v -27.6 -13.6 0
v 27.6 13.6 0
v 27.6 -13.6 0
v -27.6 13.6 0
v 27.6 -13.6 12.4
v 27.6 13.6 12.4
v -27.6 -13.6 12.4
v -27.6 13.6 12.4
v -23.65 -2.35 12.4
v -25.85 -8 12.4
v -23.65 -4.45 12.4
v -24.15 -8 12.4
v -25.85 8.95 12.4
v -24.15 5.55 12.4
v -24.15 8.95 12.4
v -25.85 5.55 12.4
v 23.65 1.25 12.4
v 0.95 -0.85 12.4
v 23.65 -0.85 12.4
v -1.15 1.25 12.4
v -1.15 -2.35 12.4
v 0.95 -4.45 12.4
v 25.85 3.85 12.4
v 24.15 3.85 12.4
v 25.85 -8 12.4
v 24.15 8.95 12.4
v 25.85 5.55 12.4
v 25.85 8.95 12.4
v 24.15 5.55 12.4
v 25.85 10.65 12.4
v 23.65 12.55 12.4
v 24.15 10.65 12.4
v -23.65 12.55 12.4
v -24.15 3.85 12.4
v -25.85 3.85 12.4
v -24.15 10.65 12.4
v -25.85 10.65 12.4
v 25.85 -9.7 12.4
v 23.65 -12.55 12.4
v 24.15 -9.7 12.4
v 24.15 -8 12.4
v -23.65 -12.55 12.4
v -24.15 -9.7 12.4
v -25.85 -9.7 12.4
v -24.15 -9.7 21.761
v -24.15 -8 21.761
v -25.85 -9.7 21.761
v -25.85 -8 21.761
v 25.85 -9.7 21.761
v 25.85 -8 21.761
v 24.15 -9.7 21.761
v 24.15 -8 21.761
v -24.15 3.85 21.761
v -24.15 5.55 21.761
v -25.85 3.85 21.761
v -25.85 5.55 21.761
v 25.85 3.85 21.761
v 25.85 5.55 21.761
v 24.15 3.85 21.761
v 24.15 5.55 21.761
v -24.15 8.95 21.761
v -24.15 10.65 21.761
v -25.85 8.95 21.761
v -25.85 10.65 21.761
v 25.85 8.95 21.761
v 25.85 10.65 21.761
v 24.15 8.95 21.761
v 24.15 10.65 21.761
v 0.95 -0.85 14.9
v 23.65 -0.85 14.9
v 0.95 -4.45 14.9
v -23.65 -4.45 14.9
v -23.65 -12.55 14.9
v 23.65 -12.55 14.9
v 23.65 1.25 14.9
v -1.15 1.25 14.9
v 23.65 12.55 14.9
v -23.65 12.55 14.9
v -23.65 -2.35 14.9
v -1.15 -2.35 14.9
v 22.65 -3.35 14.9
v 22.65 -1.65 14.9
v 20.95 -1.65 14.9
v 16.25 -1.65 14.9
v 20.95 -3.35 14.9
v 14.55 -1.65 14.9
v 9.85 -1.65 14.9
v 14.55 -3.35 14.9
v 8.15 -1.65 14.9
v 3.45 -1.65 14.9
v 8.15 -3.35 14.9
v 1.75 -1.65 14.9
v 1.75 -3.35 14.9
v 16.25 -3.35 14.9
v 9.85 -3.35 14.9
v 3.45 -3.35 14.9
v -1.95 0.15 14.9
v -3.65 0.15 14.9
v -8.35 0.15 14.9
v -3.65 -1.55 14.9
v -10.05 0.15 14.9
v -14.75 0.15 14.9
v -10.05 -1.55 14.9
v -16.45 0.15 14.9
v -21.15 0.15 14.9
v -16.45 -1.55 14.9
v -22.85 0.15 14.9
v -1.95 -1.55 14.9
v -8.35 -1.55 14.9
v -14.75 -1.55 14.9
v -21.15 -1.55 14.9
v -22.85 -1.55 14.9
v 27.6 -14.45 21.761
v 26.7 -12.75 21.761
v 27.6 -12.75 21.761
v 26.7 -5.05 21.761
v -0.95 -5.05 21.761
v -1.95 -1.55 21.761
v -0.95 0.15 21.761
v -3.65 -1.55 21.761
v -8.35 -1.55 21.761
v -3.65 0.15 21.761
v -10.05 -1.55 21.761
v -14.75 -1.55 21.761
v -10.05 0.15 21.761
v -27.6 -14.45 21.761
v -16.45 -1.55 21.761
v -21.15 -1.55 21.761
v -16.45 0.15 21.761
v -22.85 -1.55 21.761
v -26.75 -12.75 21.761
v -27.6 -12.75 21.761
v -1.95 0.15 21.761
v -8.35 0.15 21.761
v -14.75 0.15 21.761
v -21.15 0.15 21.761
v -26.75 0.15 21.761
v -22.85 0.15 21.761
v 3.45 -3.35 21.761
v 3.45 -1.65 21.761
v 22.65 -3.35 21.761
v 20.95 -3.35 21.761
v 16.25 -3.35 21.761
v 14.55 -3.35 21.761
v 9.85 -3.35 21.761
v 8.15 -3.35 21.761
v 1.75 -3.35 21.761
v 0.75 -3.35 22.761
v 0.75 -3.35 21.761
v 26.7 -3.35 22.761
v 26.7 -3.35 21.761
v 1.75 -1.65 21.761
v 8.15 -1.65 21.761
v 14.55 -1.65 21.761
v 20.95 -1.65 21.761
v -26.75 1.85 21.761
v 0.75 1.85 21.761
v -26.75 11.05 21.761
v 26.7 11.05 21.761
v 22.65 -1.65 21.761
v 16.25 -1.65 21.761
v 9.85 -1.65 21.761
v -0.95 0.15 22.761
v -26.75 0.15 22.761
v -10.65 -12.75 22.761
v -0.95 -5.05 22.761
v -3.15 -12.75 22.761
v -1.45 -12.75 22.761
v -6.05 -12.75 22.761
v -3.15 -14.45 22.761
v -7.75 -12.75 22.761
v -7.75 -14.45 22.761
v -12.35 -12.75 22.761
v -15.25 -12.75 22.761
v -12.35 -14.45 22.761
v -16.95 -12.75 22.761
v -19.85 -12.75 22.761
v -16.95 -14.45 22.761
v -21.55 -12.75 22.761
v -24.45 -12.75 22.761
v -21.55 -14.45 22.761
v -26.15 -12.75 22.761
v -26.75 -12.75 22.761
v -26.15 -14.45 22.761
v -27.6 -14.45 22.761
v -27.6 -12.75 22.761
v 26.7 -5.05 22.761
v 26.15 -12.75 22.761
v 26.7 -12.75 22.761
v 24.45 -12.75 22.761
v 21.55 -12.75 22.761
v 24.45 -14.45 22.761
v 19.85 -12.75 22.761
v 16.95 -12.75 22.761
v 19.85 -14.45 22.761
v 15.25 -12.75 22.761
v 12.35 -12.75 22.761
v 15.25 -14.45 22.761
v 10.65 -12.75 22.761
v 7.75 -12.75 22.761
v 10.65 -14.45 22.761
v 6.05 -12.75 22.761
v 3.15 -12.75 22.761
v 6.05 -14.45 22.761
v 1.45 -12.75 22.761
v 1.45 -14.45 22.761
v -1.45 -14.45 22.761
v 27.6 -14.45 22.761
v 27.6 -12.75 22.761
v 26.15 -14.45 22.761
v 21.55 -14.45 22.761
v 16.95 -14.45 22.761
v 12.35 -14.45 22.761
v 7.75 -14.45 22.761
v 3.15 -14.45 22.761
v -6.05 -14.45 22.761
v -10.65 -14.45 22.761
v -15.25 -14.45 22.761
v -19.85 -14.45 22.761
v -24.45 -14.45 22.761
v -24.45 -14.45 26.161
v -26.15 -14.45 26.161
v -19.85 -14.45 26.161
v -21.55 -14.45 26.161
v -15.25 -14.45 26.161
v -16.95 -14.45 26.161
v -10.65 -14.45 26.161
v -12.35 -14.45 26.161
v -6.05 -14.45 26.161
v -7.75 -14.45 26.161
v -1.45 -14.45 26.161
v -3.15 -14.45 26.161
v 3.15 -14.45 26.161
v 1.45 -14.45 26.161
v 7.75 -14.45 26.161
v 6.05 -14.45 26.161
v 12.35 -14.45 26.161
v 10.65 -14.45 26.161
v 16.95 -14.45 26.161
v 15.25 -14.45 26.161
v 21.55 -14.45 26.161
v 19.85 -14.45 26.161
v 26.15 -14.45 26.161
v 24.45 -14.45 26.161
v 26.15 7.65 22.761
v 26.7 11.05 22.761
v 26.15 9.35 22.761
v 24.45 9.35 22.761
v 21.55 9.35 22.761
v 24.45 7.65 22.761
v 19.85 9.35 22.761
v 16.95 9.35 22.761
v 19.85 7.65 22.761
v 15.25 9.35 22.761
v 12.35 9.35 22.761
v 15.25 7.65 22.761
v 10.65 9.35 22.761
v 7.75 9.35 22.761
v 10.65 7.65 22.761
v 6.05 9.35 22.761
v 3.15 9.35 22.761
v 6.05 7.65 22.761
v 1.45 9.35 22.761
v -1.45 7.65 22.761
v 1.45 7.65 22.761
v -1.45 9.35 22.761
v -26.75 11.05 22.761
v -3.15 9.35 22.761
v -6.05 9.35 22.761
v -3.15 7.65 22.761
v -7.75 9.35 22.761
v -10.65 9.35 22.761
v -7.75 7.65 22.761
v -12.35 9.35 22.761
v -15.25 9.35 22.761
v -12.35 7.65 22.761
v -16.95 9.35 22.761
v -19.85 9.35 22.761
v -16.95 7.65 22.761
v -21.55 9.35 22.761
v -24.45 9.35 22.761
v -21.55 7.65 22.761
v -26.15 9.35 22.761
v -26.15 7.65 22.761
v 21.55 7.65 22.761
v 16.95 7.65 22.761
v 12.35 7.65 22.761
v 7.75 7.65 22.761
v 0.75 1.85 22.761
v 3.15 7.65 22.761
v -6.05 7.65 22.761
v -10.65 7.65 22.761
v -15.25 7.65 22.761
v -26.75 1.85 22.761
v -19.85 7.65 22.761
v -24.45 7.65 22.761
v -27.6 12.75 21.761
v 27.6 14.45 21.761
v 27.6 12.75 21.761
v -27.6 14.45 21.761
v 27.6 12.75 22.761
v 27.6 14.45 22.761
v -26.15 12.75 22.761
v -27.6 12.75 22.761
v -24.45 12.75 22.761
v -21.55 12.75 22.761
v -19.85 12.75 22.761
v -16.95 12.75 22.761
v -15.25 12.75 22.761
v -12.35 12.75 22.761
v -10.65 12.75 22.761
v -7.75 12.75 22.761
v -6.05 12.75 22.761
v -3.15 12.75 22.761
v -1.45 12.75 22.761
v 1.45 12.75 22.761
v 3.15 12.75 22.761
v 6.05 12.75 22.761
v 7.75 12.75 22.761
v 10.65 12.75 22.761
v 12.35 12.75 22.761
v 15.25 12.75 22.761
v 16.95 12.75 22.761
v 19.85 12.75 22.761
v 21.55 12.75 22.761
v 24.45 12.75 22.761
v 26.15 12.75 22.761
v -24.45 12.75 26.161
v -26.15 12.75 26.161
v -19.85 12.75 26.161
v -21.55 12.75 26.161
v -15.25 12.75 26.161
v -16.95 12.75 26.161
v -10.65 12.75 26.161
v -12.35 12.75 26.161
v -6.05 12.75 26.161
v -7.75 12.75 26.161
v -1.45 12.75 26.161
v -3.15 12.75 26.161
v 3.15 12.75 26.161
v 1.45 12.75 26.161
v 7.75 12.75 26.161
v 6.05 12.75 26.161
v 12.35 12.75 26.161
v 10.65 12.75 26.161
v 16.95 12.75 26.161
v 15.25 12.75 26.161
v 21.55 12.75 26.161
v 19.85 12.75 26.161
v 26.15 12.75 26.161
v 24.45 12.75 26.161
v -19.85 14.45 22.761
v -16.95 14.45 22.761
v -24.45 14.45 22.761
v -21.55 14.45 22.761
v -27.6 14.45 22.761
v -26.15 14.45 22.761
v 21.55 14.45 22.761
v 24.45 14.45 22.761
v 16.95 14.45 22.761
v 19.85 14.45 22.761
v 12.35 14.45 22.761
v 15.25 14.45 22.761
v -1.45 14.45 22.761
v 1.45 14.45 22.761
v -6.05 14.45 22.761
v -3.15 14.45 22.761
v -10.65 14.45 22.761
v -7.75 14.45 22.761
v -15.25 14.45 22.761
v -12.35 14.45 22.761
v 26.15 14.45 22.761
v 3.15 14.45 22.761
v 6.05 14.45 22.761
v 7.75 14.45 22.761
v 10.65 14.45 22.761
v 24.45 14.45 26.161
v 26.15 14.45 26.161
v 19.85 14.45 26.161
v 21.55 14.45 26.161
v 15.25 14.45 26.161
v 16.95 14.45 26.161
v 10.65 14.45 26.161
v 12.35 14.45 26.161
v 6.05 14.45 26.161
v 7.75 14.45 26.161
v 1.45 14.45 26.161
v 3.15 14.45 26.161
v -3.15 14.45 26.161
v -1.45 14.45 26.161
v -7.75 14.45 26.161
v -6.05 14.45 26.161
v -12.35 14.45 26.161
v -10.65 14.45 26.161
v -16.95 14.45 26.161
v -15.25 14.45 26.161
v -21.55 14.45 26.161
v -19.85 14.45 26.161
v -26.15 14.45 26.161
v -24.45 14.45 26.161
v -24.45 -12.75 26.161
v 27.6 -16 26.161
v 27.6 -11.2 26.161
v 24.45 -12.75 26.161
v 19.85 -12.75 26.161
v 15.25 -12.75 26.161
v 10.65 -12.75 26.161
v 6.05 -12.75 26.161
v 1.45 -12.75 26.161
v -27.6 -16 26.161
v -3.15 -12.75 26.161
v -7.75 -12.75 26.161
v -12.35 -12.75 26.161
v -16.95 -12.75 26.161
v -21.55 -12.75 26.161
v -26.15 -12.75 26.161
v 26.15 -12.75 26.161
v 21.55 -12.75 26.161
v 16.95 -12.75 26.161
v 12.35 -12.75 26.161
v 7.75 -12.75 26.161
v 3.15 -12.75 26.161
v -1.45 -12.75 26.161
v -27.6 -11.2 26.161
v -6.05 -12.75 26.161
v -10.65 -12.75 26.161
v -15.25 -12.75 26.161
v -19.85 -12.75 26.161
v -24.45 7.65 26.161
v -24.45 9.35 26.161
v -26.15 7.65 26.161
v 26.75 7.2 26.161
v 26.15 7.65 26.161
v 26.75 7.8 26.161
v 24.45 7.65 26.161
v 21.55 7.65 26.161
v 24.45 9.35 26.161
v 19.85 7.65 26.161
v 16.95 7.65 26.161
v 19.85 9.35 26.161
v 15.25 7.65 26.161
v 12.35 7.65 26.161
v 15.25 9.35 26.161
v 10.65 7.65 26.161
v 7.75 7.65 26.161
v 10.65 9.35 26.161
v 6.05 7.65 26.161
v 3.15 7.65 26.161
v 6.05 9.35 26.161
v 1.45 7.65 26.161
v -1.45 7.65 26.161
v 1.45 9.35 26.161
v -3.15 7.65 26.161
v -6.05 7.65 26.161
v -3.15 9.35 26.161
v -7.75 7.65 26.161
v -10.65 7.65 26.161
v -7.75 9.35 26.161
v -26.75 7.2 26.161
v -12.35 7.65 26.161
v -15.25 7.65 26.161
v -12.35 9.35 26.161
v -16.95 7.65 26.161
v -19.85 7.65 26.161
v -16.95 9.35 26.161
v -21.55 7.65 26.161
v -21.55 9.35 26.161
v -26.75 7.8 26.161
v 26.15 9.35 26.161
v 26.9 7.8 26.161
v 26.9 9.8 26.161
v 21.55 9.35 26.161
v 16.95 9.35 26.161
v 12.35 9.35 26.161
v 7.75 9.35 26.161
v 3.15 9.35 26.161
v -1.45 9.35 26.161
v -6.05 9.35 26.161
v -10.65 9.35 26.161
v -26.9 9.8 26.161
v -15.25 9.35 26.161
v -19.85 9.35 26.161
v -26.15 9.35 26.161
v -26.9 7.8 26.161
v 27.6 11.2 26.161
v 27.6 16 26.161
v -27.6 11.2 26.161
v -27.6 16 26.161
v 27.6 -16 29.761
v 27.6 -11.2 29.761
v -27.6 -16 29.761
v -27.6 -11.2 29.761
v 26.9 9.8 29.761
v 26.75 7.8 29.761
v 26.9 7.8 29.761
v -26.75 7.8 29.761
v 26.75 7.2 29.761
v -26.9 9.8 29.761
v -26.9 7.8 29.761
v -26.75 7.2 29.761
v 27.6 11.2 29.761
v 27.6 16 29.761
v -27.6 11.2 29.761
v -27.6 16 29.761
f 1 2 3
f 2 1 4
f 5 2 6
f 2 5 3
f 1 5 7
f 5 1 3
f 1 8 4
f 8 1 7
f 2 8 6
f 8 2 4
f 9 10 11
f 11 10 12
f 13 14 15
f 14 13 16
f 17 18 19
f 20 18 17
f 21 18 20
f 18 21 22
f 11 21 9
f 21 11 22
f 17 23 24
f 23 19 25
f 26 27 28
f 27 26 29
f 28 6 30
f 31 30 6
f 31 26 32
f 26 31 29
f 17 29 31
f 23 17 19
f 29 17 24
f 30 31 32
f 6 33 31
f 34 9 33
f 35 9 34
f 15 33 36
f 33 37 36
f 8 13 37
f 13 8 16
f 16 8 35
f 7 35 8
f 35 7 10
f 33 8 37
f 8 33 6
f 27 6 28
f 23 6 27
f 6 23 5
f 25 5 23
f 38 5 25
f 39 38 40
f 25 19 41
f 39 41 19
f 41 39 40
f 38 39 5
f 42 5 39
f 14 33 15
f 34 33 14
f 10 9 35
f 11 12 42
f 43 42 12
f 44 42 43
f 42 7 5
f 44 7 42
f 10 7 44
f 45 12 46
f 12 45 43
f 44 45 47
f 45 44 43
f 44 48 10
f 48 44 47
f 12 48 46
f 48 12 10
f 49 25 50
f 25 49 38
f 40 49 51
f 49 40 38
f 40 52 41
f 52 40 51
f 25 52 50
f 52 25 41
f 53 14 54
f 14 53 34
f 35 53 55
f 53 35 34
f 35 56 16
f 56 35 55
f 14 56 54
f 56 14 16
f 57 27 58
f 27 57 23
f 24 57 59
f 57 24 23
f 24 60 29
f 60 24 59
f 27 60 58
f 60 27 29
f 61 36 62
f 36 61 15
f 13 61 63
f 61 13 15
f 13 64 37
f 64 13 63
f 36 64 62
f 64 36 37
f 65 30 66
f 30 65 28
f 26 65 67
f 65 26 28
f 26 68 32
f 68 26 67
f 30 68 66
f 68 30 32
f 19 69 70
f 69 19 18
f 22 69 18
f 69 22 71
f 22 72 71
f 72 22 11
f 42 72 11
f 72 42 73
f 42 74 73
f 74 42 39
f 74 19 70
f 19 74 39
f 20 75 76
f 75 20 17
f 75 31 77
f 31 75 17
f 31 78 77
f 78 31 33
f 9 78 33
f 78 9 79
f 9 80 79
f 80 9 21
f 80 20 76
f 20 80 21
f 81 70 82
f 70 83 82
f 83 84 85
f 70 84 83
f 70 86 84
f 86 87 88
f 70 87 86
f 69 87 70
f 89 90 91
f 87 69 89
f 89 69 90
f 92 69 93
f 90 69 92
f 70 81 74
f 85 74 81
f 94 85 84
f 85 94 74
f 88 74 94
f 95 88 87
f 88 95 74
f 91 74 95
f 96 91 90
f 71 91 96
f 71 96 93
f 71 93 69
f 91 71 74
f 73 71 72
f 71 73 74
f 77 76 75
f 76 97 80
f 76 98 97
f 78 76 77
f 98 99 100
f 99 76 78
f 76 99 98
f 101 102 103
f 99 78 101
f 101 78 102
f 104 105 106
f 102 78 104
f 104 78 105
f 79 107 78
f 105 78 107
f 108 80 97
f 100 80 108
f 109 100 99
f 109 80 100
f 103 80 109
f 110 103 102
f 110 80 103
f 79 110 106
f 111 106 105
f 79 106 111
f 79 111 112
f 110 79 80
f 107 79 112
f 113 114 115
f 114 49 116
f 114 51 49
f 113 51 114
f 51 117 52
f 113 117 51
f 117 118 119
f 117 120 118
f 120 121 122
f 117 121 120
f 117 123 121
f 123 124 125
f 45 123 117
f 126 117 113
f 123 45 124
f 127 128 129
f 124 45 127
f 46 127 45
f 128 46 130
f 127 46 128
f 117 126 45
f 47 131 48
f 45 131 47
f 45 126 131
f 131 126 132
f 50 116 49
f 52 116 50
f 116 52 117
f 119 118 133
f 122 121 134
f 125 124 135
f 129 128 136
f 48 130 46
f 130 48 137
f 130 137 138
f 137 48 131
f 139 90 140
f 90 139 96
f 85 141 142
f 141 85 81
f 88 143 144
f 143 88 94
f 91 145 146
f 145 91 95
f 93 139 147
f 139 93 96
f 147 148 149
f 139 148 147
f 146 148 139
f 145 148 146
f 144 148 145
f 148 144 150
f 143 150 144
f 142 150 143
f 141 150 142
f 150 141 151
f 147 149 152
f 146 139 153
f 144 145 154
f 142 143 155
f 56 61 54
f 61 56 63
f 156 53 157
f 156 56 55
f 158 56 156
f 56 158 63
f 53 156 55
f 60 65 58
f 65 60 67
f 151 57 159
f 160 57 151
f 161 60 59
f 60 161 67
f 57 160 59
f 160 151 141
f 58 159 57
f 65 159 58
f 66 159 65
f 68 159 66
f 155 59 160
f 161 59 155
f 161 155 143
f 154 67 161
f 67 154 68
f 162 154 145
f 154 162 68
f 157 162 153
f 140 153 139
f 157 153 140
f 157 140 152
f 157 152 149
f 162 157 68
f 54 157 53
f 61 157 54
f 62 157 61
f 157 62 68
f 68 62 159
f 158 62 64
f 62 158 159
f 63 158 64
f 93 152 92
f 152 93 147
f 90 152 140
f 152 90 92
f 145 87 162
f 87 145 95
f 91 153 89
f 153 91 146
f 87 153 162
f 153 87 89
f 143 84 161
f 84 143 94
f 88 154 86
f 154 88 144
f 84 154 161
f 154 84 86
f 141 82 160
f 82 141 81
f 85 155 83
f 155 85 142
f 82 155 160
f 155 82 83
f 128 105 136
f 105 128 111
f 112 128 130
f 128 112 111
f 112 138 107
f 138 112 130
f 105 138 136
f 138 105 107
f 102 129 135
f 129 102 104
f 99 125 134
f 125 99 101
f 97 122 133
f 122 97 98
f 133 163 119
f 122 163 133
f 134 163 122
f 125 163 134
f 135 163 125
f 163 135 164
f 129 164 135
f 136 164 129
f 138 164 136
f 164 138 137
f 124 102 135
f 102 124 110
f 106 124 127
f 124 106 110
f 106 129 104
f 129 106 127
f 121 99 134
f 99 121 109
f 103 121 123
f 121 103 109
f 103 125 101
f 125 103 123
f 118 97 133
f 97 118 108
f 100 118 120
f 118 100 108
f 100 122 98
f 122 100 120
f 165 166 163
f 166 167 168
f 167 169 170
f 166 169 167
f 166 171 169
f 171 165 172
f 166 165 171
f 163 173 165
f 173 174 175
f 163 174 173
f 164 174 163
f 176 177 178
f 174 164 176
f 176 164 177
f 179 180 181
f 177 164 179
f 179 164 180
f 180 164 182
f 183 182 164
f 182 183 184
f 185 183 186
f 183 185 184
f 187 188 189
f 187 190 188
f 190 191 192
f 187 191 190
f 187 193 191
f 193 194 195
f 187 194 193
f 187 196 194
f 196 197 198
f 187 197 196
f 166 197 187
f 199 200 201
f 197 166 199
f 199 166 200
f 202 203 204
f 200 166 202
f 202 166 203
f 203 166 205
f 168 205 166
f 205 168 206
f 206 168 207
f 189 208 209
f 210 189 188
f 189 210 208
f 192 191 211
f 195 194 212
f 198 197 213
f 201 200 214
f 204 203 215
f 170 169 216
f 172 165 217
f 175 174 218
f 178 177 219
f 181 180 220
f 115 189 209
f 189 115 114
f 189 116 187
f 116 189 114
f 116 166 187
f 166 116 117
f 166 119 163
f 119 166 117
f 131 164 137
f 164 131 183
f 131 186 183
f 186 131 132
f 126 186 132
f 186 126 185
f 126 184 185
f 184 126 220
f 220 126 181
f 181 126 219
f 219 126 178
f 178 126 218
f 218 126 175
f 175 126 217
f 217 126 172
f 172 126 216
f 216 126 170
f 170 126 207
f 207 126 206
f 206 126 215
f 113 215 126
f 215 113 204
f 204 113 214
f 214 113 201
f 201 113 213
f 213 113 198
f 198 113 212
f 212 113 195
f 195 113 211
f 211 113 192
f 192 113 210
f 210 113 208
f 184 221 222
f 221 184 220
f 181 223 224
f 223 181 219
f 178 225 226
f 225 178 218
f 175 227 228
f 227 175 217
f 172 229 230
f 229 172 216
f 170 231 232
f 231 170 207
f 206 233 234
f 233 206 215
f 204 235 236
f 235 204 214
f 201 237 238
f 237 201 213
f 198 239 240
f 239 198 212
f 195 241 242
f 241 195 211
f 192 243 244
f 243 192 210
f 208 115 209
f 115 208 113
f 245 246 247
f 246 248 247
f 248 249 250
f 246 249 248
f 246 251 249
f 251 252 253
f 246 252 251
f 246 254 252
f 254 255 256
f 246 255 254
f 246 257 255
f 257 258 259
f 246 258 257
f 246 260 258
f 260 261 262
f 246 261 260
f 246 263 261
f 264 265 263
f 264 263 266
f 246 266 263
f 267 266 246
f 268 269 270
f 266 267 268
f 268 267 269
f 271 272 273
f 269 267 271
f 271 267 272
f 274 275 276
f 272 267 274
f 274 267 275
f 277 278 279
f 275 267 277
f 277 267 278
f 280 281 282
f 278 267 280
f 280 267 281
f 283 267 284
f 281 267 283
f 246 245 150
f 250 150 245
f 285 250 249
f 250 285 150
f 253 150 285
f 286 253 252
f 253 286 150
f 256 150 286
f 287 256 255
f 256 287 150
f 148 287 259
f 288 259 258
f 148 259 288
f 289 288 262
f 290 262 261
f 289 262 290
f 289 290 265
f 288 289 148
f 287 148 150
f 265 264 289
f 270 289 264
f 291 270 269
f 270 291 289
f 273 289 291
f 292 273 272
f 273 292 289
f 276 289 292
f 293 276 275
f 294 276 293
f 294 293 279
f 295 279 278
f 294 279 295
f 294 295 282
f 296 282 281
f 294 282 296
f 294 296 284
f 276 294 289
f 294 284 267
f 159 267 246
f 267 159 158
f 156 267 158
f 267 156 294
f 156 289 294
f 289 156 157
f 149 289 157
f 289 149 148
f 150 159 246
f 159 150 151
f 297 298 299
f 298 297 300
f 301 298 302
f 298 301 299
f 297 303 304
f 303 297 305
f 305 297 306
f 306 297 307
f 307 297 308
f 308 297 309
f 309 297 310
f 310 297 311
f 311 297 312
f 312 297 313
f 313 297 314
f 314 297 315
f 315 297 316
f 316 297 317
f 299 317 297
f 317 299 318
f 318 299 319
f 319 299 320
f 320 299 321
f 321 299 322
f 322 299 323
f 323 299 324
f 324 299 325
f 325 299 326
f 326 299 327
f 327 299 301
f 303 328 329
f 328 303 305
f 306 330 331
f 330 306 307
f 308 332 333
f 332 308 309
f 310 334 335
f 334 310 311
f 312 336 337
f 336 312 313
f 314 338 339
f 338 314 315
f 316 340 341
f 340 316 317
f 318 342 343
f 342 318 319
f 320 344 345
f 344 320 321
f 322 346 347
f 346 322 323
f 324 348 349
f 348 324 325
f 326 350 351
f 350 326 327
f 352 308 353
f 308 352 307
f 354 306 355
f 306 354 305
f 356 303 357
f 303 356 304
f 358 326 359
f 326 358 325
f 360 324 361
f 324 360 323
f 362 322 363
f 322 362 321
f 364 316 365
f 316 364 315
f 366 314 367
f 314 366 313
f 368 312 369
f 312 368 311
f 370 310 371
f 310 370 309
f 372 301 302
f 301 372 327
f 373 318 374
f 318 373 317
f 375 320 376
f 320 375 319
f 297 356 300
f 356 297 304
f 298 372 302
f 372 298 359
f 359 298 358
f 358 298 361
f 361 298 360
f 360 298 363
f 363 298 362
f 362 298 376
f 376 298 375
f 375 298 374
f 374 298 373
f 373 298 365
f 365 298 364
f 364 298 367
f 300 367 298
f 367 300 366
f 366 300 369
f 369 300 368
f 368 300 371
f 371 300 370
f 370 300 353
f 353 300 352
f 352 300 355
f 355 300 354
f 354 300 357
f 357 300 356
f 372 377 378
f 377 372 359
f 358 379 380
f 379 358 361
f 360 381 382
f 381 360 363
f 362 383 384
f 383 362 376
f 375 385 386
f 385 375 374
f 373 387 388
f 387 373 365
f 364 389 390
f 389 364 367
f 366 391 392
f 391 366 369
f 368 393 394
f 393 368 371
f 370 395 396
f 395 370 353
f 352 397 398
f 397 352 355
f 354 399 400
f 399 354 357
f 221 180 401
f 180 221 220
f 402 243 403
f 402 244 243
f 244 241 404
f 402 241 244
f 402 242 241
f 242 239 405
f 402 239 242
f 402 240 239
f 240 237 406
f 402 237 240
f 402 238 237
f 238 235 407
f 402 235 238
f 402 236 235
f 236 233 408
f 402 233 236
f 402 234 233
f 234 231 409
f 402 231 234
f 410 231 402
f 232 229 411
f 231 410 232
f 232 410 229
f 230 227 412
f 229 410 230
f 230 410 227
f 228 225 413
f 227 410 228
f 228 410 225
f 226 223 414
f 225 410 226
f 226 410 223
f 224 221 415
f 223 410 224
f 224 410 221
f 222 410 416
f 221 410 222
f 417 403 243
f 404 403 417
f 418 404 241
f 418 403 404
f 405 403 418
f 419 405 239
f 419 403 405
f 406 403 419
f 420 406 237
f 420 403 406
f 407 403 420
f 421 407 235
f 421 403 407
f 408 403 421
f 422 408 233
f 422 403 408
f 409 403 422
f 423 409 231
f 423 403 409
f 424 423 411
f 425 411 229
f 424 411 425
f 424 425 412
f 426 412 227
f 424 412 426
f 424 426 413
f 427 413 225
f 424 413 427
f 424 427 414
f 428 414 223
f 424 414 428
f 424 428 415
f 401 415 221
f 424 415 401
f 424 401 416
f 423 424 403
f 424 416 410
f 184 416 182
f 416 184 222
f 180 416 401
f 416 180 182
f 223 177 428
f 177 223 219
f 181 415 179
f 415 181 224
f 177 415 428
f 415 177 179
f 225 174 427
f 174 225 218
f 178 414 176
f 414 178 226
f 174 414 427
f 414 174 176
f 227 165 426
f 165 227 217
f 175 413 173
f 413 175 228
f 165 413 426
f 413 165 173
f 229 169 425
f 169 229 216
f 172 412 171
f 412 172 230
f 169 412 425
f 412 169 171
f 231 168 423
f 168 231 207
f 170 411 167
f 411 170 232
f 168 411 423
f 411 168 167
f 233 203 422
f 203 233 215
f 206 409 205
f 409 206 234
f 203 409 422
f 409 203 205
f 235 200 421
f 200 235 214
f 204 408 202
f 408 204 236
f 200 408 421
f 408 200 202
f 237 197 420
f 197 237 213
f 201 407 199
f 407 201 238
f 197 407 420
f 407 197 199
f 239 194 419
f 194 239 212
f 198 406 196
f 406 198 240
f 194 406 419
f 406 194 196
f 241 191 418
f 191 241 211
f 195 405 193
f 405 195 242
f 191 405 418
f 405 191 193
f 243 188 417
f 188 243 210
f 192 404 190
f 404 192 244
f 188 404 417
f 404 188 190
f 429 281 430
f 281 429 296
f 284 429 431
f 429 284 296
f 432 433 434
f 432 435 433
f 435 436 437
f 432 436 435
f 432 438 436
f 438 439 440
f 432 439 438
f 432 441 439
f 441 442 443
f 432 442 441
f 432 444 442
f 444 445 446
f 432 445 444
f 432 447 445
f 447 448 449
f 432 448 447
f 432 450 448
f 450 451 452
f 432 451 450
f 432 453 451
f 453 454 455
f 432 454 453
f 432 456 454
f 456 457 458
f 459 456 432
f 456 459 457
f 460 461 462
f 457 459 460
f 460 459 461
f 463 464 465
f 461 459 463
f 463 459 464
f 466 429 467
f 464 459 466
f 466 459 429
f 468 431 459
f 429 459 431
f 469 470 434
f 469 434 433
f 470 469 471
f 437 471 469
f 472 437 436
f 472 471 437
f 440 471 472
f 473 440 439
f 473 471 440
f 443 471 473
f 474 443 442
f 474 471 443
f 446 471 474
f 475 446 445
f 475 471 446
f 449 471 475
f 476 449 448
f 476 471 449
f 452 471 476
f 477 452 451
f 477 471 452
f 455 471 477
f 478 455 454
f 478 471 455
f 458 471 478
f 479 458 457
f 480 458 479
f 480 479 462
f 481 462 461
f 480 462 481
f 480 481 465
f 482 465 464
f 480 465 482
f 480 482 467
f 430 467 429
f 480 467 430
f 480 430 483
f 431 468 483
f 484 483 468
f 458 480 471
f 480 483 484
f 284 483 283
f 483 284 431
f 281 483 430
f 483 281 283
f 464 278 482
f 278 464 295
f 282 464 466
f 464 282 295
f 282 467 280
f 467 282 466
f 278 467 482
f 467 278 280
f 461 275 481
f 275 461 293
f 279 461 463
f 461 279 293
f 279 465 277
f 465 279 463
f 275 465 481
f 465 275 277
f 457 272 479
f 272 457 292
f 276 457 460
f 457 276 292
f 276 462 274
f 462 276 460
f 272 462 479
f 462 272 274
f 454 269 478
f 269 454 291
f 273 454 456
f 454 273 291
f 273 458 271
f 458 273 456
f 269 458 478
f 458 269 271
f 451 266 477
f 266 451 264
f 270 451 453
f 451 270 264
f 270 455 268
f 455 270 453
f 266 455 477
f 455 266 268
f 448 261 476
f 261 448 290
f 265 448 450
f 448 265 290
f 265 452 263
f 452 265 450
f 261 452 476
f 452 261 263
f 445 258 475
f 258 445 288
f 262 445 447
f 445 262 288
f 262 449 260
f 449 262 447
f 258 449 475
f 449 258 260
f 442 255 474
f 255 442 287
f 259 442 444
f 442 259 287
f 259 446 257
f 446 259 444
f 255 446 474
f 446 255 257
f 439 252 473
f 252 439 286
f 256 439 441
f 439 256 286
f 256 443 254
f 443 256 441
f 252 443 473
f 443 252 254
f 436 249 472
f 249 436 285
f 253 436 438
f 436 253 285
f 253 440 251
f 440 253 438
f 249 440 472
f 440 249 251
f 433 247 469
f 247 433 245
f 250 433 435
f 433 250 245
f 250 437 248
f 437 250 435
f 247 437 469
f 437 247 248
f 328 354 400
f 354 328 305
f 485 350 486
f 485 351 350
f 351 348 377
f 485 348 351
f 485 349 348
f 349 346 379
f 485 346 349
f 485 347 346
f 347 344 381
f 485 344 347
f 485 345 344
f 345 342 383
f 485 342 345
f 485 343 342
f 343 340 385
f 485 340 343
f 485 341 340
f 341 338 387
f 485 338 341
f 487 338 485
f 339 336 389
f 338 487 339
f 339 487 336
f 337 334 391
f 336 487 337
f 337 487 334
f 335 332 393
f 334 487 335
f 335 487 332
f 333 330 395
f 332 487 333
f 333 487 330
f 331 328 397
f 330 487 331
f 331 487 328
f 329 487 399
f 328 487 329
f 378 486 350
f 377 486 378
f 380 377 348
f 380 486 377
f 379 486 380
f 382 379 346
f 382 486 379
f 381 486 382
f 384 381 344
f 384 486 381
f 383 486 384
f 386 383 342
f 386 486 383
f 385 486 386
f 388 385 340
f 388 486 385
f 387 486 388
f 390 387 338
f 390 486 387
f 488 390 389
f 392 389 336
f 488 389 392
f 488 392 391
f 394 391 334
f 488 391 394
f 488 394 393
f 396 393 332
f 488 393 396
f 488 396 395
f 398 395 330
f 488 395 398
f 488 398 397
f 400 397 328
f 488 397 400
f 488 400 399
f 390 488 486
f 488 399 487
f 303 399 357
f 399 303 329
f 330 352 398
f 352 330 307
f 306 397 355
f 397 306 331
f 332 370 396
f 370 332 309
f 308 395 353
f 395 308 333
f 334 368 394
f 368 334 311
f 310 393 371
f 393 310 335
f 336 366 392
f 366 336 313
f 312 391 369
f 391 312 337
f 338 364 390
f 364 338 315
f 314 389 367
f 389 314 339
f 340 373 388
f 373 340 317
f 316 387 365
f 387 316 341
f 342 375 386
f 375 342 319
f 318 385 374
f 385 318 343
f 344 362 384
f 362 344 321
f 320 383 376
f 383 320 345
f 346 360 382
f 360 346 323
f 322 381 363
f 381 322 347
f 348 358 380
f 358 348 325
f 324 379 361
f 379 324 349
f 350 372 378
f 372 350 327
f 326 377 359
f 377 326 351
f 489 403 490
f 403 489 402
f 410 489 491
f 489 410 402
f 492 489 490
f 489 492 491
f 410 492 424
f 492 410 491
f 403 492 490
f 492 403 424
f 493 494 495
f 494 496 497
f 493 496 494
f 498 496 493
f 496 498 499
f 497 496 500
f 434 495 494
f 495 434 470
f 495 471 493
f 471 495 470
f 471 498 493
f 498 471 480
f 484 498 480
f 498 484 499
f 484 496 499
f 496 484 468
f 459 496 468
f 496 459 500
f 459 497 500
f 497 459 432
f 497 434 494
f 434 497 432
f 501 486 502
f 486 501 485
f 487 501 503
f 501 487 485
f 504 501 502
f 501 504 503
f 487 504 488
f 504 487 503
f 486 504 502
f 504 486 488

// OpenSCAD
// Generated by SolidPython 0.4.2 on 2020-09-29 23:21:05
//!OpenSCAD

scale(v = 0.0100000000) {
	translate(v = [-2760, -1360, 0]) {
		union() {
			color(c = [0.4000000000, 0.4000000000, 0.4000000000]) {
				translate(v = [0, 0, 0]) {
					linear_extrude(height = 1000.0000000000) {
						polygon(paths = [[0, 1, 2, 3]], points = [[0, 0], [0, 2720], [5520, 2720], [5520, 0]]);
					}
				}
			}
			color(c = [0.2000000000, 0.6000000000, 0.2000000000]) {
				translate(v = [0, 0, 1000.0000000000]) {
					linear_extrude(height = 120.0000000000) {
						polygon(paths = [[0, 1, 2, 3]], points = [[0, 1305], [0, 2720], [5520, 2720], [5520, 1305]]);
					}
				}
			}
			color(c = [0.4000000000, 0.4000000000, 0.4000000000]) {
				translate(v = [0, 0, 1000.0000000000]) {
					linear_extrude(height = 120.0000000000) {
						polygon(paths = [[0, 1, 2, 3]], points = [[0, 0], [0, 1305], [5520, 1305], [5520, 0]]);
					}
				}
			}
			color(c = [0.9000000000, 0.6000000000, 0.6000000000]) {
				translate(v = [0, 0, 1120.0000000000]) {
					linear_extrude(height = 120.0000000000) {
						polygon(paths = [[0, 1, 2, 3]], points = [[135, 1615], [135, 2485], [395, 2485], [395, 1615]]);
					}
				}
			}
			color(c = [0.9000000000, 0.6000000000, 0.6000000000]) {
				translate(v = [0, 0, 1120.0000000000]) {
					linear_extrude(height = 120.0000000000) {
						polygon(paths = [[0, 1, 2, 3]], points = [[5125, 1615], [5125, 2485], [5385, 2485], [5385, 1615]]);
					}
				}
			}
			color(c = [0.9000000000, 0.6000000000, 0.9000000000]) {
				translate(v = [0, 0, 1120.0000000000]) {
					linear_extrude(height = 120.0000000000) {
						polygon(paths = [[0, 1, 2, 3]], points = [[135, 235], [135, 785], [395, 785], [395, 235]]);
					}
				}
			}
			color(c = [0.9000000000, 0.6000000000, 0.9000000000]) {
				translate(v = [0, 0, 1120.0000000000]) {
					linear_extrude(height = 120.0000000000) {
						polygon(paths = [[0, 1, 2, 3]], points = [[5125, 235], [5125, 785], [5385, 785], [5385, 235]]);
					}
				}
			}
			color(c = [0.2000000000, 0.6000000000, 0.2000000000]) {
				translate(v = [0, 0, 1120.0000000000]) {
					linear_extrude(height = 120.0000000000) {
						difference() {
							polygon(paths = [[0, 1, 2, 3]], points = [[0, 1305], [0, 2720], [5520, 2720], [5520, 1305]]);
							polygon(paths = [[0, 1, 2, 3]], points = [[135, 1615], [395, 1615], [395, 2485], [135, 2485]]);
							polygon(paths = [[0, 1, 2, 3]], points = [[5125, 1615], [5385, 1615], [5385, 2485], [5125, 2485]]);
						}
					}
				}
			}
			color(c = [0.4000000000, 0.4000000000, 0.4000000000]) {
				translate(v = [0, 0, 1120.0000000000]) {
					linear_extrude(height = 120.0000000000) {
						difference() {
							polygon(paths = [[0, 1, 2, 3]], points = [[0, 0], [0, 1305], [5520, 1305], [5520, 0]]);
							polygon(paths = [[0, 1, 2, 3]], points = [[135, 235], [395, 235], [395, 785], [135, 785]]);
							polygon(paths = [[0, 1, 2, 3]], points = [[5125, 235], [5385, 235], [5385, 785], [5125, 785]]);
						}
					}
				}
			}
			color(c = [0.1000000000, 0.1000000000, 0.1000000000]) {
				translate(v = [0, 0, 1240.0000000000]) {
					linear_extrude(height = 70.0000000000) {
						polygon(paths = [[0, 1, 2, 3]], points = [[175, 390], [175, 560], [345, 560], [345, 390]]);
					}
				}
			}
			color(c = [0.1000000000, 0.1000000000, 0.1000000000]) {
				translate(v = [0, 0, 1240.0000000000]) {
					linear_extrude(height = 70.0000000000) {
						polygon(paths = [[0, 1, 2, 3]], points = [[5175, 390], [5175, 560], [5345, 560], [5345, 390]]);
					}
				}
			}
			color(c = [0.1000000000, 0.1000000000, 0.1000000000]) {
				translate(v = [0, 0, 1240.0000000000]) {
					linear_extrude(height = 70.0000000000) {
						polygon(paths = [[0, 1, 2, 3]], points = [[175, 1745], [175, 1915], [345, 1915], [345, 1745]]);
					}
				}
			}
			color(c = [0.1000000000, 0.1000000000, 0.1000000000]) {
				translate(v = [0, 0, 1240.0000000000]) {
					linear_extrude(height = 70.0000000000) {
						polygon(paths = [[0, 1, 2, 3]], points = [[5175, 1745], [5175, 1915], [5345, 1915], [5345, 1745]]);
					}
				}
			}
			color(c = [0.1000000000, 0.1000000000, 0.1000000000]) {
				translate(v = [0, 0, 1240.0000000000]) {
					linear_extrude(height = 70.0000000000) {
						polygon(paths = [[0, 1, 2, 3]], points = [[175, 2255], [175, 2425], [345, 2425], [345, 2255]]);
					}
				}
			}
			color(c = [0.1000000000, 0.1000000000, 0.1000000000]) {
				translate(v = [0, 0, 1240.0000000000]) {
					linear_extrude(height = 70.0000000000) {
						polygon(paths = [[0, 1, 2, 3]], points = [[5175, 2255], [5175, 2425], [5345, 2425], [5345, 2255]]);
					}
				}
			}
			color(c = [1.0000000000, 1.0000000000, 1.0000000000]) {
				translate(v = [0, 0, 1240.0000000000]) {
					linear_extrude(height = 70.0000000000) {
						polygon(paths = [[0, 1, 2, 3, 4, 5]], points = [[395, 105], [395, 915], [2855, 915], [2855, 1275], [5125, 1275], [5125, 105]]);
					}
				}
			}
			color(c = [1.0000000000, 1.0000000000, 1.0000000000]) {
				translate(v = [0, 0, 1240.0000000000]) {
					linear_extrude(height = 70.0000000000) {
						polygon(paths = [[0, 1, 2, 3, 4, 5]], points = [[395, 1125], [395, 2615], [5125, 2615], [5125, 1485], [2645, 1485], [2645, 1125]]);
					}
				}
			}
			color(c = [0.1000000000, 0.1000000000, 0.1000000000]) {
				translate(v = [0, 0, 1310.0000000000]) {
					linear_extrude(height = 180.0000000000) {
						polygon(paths = [[0, 1, 2, 3]], points = [[175, 390], [175, 560], [345, 560], [345, 390]]);
					}
				}
			}
			color(c = [0.1000000000, 0.1000000000, 0.1000000000]) {
				translate(v = [0, 0, 1310.0000000000]) {
					linear_extrude(height = 180.0000000000) {
						polygon(paths = [[0, 1, 2, 3]], points = [[5175, 390], [5175, 560], [5345, 560], [5345, 390]]);
					}
				}
			}
			color(c = [0.1000000000, 0.1000000000, 0.1000000000]) {
				translate(v = [0, 0, 1310.0000000000]) {
					linear_extrude(height = 180.0000000000) {
						polygon(paths = [[0, 1, 2, 3]], points = [[175, 1745], [175, 1915], [345, 1915], [345, 1745]]);
					}
				}
			}
			color(c = [0.1000000000, 0.1000000000, 0.1000000000]) {
				translate(v = [0, 0, 1310.0000000000]) {
					linear_extrude(height = 180.0000000000) {
						polygon(paths = [[0, 1, 2, 3]], points = [[5175, 1745], [5175, 1915], [5345, 1915], [5345, 1745]]);
					}
				}
			}
			color(c = [0.1000000000, 0.1000000000, 0.1000000000]) {
				translate(v = [0, 0, 1310.0000000000]) {
					linear_extrude(height = 180.0000000000) {
						polygon(paths = [[0, 1, 2, 3]], points = [[175, 2255], [175, 2425], [345, 2425], [345, 2255]]);
					}
				}
			}
			color(c = [0.1000000000, 0.1000000000, 0.1000000000]) {
				translate(v = [0, 0, 1310.0000000000]) {
					linear_extrude(height = 180.0000000000) {
						polygon(paths = [[0, 1, 2, 3]], points = [[5175, 2255], [5175, 2425], [5345, 2425], [5345, 2255]]);
					}
				}
			}
			color(c = [0.7000000000, 0, 0]) {
				translate(v = [0, 0, 1310.0000000000]) {
					linear_extrude(height = 180.0000000000) {
						polygon(paths = [[0, 1, 2, 3, 4, 5]], points = [[395, 105], [395, 915], [2855, 915], [2855, 1275], [5125, 1275], [5125, 105]]);
					}
				}
			}
			color(c = [0.7000000000, 0, 0]) {
				translate(v = [0, 0, 1310.0000000000]) {
					linear_extrude(height = 180.0000000000) {
						polygon(paths = [[0, 1, 2, 3, 4, 5]], points = [[395, 1125], [395, 2615], [5125, 2615], [5125, 1485], [2645, 1485], [2645, 1125]]);
					}
				}
			}
			color(c = [0.1000000000, 0.1000000000, 0.1000000000]) {
				translate(v = [0, 0, 1490.0000000000]) {
					linear_extrude(height = 686.1000000000) {
						polygon(paths = [[0, 1, 2, 3]], points = [[175, 390], [175, 560], [345, 560], [345, 390]]);
					}
				}
			}
			color(c = [0.1000000000, 0.1000000000, 0.1000000000]) {
				translate(v = [0, 0, 1490.0000000000]) {
					linear_extrude(height = 686.1000000000) {
						polygon(paths = [[0, 1, 2, 3]], points = [[5175, 390], [5175, 560], [5345, 560], [5345, 390]]);
					}
				}
			}
			color(c = [0.1000000000, 0.1000000000, 0.1000000000]) {
				translate(v = [0, 0, 1490.0000000000]) {
					linear_extrude(height = 686.1000000000) {
						polygon(paths = [[0, 1, 2, 3]], points = [[2935, 1025], [2935, 1195], [3105, 1195], [3105, 1025]]);
					}
				}
			}
			color(c = [0.1000000000, 0.1000000000, 0.1000000000]) {
				translate(v = [0, 0, 1490.0000000000]) {
					linear_extrude(height = 686.1000000000) {
						polygon(paths = [[0, 1, 2, 3]], points = [[3575, 1025], [3575, 1195], [3745, 1195], [3745, 1025]]);
					}
				}
			}
			color(c = [0.1000000000, 0.1000000000, 0.1000000000]) {
				translate(v = [0, 0, 1490.0000000000]) {
					linear_extrude(height = 686.1000000000) {
						polygon(paths = [[0, 1, 2, 3]], points = [[4215, 1025], [4215, 1195], [4385, 1195], [4385, 1025]]);
					}
				}
			}
			color(c = [0.1000000000, 0.1000000000, 0.1000000000]) {
				translate(v = [0, 0, 1490.0000000000]) {
					linear_extrude(height = 686.1000000000) {
						polygon(paths = [[0, 1, 2, 3]], points = [[4855, 1025], [4855, 1195], [5025, 1195], [5025, 1025]]);
					}
				}
			}
			color(c = [0.1000000000, 0.1000000000, 0.1000000000]) {
				translate(v = [0, 0, 1490.0000000000]) {
					linear_extrude(height = 686.1000000000) {
						polygon(paths = [[0, 1, 2, 3]], points = [[475, 1205], [475, 1375], [645, 1375], [645, 1205]]);
					}
				}
			}
			color(c = [0.1000000000, 0.1000000000, 0.1000000000]) {
				translate(v = [0, 0, 1490.0000000000]) {
					linear_extrude(height = 686.1000000000) {
						polygon(paths = [[0, 1, 2, 3]], points = [[1115, 1205], [1115, 1375], [1285, 1375], [1285, 1205]]);
					}
				}
			}
			color(c = [0.1000000000, 0.1000000000, 0.1000000000]) {
				translate(v = [0, 0, 1490.0000000000]) {
					linear_extrude(height = 686.1000000000) {
						polygon(paths = [[0, 1, 2, 3]], points = [[1755, 1205], [1755, 1375], [1925, 1375], [1925, 1205]]);
					}
				}
			}
			color(c = [0.1000000000, 0.1000000000, 0.1000000000]) {
				translate(v = [0, 0, 1490.0000000000]) {
					linear_extrude(height = 686.1000000000) {
						polygon(paths = [[0, 1, 2, 3]], points = [[2395, 1205], [2395, 1375], [2565, 1375], [2565, 1205]]);
					}
				}
			}
			color(c = [0.1000000000, 0.1000000000, 0.1000000000]) {
				translate(v = [0, 0, 1490.0000000000]) {
					linear_extrude(height = 686.1000000000) {
						polygon(paths = [[0, 1, 2, 3]], points = [[175, 1745], [175, 1915], [345, 1915], [345, 1745]]);
					}
				}
			}
			color(c = [0.1000000000, 0.1000000000, 0.1000000000]) {
				translate(v = [0, 0, 1490.0000000000]) {
					linear_extrude(height = 686.1000000000) {
						polygon(paths = [[0, 1, 2, 3]], points = [[5175, 1745], [5175, 1915], [5345, 1915], [5345, 1745]]);
					}
				}
			}
			color(c = [0.1000000000, 0.1000000000, 0.1000000000]) {
				translate(v = [0, 0, 1490.0000000000]) {
					linear_extrude(height = 686.1000000000) {
						polygon(paths = [[0, 1, 2, 3]], points = [[175, 2255], [175, 2425], [345, 2425], [345, 2255]]);
					}
				}
			}
			color(c = [0.1000000000, 0.1000000000, 0.1000000000]) {
				translate(v = [0, 0, 1490.0000000000]) {
					linear_extrude(height = 686.1000000000) {
						polygon(paths = [[0, 1, 2, 3]], points = [[5175, 2255], [5175, 2425], [5345, 2425], [5345, 2255]]);
					}
				}
			}
			color(c = [0.9000000000, 0.6000000000, 0.6000000000]) {
				translate(v = [0, 0, 2176.1000000000]) {
					linear_extrude(height = 100.0000000000) {
						polygon(paths = [[0, 1, 2, 3, 4, 5, 6, 7, 8, 9]], points = [[0, -85], [0, 85], [85, 85], [85, 1375], [2665, 1375], [2665, 855], [5430, 855], [5430, 85], [5520, 85], [5520, -85]]);
					}
				}
			}
			color(c = [0.9000000000, 0.6000000000, 0.6000000000]) {
				translate(v = [0, 0, 2176.1000000000]) {
					linear_extrude(height = 100.0000000000) {
						polygon(paths = [[0, 1, 2, 3, 4, 5]], points = [[2835, 1025], [2835, 1545], [85, 1545], [85, 2465], [5430, 2465], [5430, 1025]]);
					}
				}
			}
			color(c = [0.9000000000, 0.6000000000, 0.6000000000]) {
				translate(v = [0, 0, 2176.1000000000]) {
					linear_extrude(height = 100.0000000000) {
						polygon(paths = [[0, 1, 2, 3]], points = [[0, 2635], [0, 2805], [5520, 2805], [5520, 2635]]);
					}
				}
			}
			color(c = [0.5000000000, 0.5000000000, 0.5000000000]) {
				translate(v = [0, 0, 2276.1000000000]) {
					linear_extrude(height = 340.0000000000) {
						polygon(paths = [[0, 1, 2, 3]], points = [[145, -85], [145, 85], [315, 85], [315, -85]]);
					}
				}
			}
			color(c = [0.5000000000, 0.5000000000, 0.5000000000]) {
				translate(v = [0, 0, 2276.1000000000]) {
					linear_extrude(height = 340.0000000000) {
						polygon(paths = [[0, 1, 2, 3]], points = [[605, -85], [605, 85], [775, 85], [775, -85]]);
					}
				}
			}
			color(c = [0.5000000000, 0.5000000000, 0.5000000000]) {
				translate(v = [0, 0, 2276.1000000000]) {
					linear_extrude(height = 340.0000000000) {
						polygon(paths = [[0, 1, 2, 3]], points = [[1065, -85], [1065, 85], [1235, 85], [1235, -85]]);
					}
				}
			}
			color(c = [0.5000000000, 0.5000000000, 0.5000000000]) {
				translate(v = [0, 0, 2276.1000000000]) {
					linear_extrude(height = 340.0000000000) {
						polygon(paths = [[0, 1, 2, 3]], points = [[1525, -85], [1525, 85], [1695, 85], [1695, -85]]);
					}
				}
			}
			color(c = [0.5000000000, 0.5000000000, 0.5000000000]) {
				translate(v = [0, 0, 2276.1000000000]) {
					linear_extrude(height = 340.0000000000) {
						polygon(paths = [[0, 1, 2, 3]], points = [[1985, -85], [1985, 85], [2155, 85], [2155, -85]]);
					}
				}
			}
			color(c = [0.5000000000, 0.5000000000, 0.5000000000]) {
				translate(v = [0, 0, 2276.1000000000]) {
					linear_extrude(height = 340.0000000000) {
						polygon(paths = [[0, 1, 2, 3]], points = [[2445, -85], [2445, 85], [2615, 85], [2615, -85]]);
					}
				}
			}
			color(c = [0.5000000000, 0.5000000000, 0.5000000000]) {
				translate(v = [0, 0, 2276.1000000000]) {
					linear_extrude(height = 340.0000000000) {
						polygon(paths = [[0, 1, 2, 3]], points = [[2905, -85], [2905, 85], [3075, 85], [3075, -85]]);
					}
				}
			}
			color(c = [0.5000000000, 0.5000000000, 0.5000000000]) {
				translate(v = [0, 0, 2276.1000000000]) {
					linear_extrude(height = 340.0000000000) {
						polygon(paths = [[0, 1, 2, 3]], points = [[3365, -85], [3365, 85], [3535, 85], [3535, -85]]);
					}
				}
			}
			color(c = [0.5000000000, 0.5000000000, 0.5000000000]) {
				translate(v = [0, 0, 2276.1000000000]) {
					linear_extrude(height = 340.0000000000) {
						polygon(paths = [[0, 1, 2, 3]], points = [[3825, -85], [3825, 85], [3995, 85], [3995, -85]]);
					}
				}
			}
			color(c = [0.5000000000, 0.5000000000, 0.5000000000]) {
				translate(v = [0, 0, 2276.1000000000]) {
					linear_extrude(height = 340.0000000000) {
						polygon(paths = [[0, 1, 2, 3]], points = [[4285, -85], [4285, 85], [4455, 85], [4455, -85]]);
					}
				}
			}
			color(c = [0.5000000000, 0.5000000000, 0.5000000000]) {
				translate(v = [0, 0, 2276.1000000000]) {
					linear_extrude(height = 340.0000000000) {
						polygon(paths = [[0, 1, 2, 3]], points = [[4745, -85], [4745, 85], [4915, 85], [4915, -85]]);
					}
				}
			}
			color(c = [0.5000000000, 0.5000000000, 0.5000000000]) {
				translate(v = [0, 0, 2276.1000000000]) {
					linear_extrude(height = 340.0000000000) {
						polygon(paths = [[0, 1, 2, 3]], points = [[5205, -85], [5205, 85], [5375, 85], [5375, -85]]);
					}
				}
			}
			color(c = [0.5000000000, 0.5000000000, 0.5000000000]) {
				translate(v = [0, 0, 2276.1000000000]) {
					linear_extrude(height = 340.0000000000) {
						polygon(paths = [[0, 1, 2, 3]], points = [[145, 2125], [145, 2295], [315, 2295], [315, 2125]]);
					}
				}
			}
			color(c = [0.5000000000, 0.5000000000, 0.5000000000]) {
				translate(v = [0, 0, 2276.1000000000]) {
					linear_extrude(height = 340.0000000000) {
						polygon(paths = [[0, 1, 2, 3]], points = [[605, 2125], [605, 2295], [775, 2295], [775, 2125]]);
					}
				}
			}
			color(c = [0.5000000000, 0.5000000000, 0.5000000000]) {
				translate(v = [0, 0, 2276.1000000000]) {
					linear_extrude(height = 340.0000000000) {
						polygon(paths = [[0, 1, 2, 3]], points = [[1065, 2125], [1065, 2295], [1235, 2295], [1235, 2125]]);
					}
				}
			}
			color(c = [0.5000000000, 0.5000000000, 0.5000000000]) {
				translate(v = [0, 0, 2276.1000000000]) {
					linear_extrude(height = 340.0000000000) {
						polygon(paths = [[0, 1, 2, 3]], points = [[1525, 2125], [1525, 2295], [1695, 2295], [1695, 2125]]);
					}
				}
			}
			color(c = [0.5000000000, 0.5000000000, 0.5000000000]) {
				translate(v = [0, 0, 2276.1000000000]) {
					linear_extrude(height = 340.0000000000) {
						polygon(paths = [[0, 1, 2, 3]], points = [[1985, 2125], [1985, 2295], [2155, 2295], [2155, 2125]]);
					}
				}
			}
			color(c = [0.5000000000, 0.5000000000, 0.5000000000]) {
				translate(v = [0, 0, 2276.1000000000]) {
					linear_extrude(height = 340.0000000000) {
						polygon(paths = [[0, 1, 2, 3]], points = [[2445, 2125], [2445, 2295], [2615, 2295], [2615, 2125]]);
					}
				}
			}
			color(c = [0.5000000000, 0.5000000000, 0.5000000000]) {
				translate(v = [0, 0, 2276.1000000000]) {
					linear_extrude(height = 340.0000000000) {
						polygon(paths = [[0, 1, 2, 3]], points = [[2905, 2125], [2905, 2295], [3075, 2295], [3075, 2125]]);
					}
				}
			}
			color(c = [0.5000000000, 0.5000000000, 0.5000000000]) {
				translate(v = [0, 0, 2276.1000000000]) {
					linear_extrude(height = 340.0000000000) {
						polygon(paths = [[0, 1, 2, 3]], points = [[3365, 2125], [3365, 2295], [3535, 2295], [3535, 2125]]);
					}
				}
			}
			color(c = [0.5000000000, 0.5000000000, 0.5000000000]) {
				translate(v = [0, 0, 2276.1000000000]) {
					linear_extrude(height = 340.0000000000) {
						polygon(paths = [[0, 1, 2, 3]], points = [[3825, 2125], [3825, 2295], [3995, 2295], [3995, 2125]]);
					}
				}
			}
			color(c = [0.5000000000, 0.5000000000, 0.5000000000]) {
				translate(v = [0, 0, 2276.1000000000]) {
					linear_extrude(height = 340.0000000000) {
						polygon(paths = [[0, 1, 2, 3]], points = [[4285, 2125], [4285, 2295], [4455, 2295], [4455, 2125]]);
					}
				}
			}
			color(c = [0.5000000000, 0.5000000000, 0.5000000000]) {
				translate(v = [0, 0, 2276.1000000000]) {
					linear_extrude(height = 340.0000000000) {
						polygon(paths = [[0, 1, 2, 3]], points = [[4745, 2125], [4745, 2295], [4915, 2295], [4915, 2125]]);
					}
				}
			}
			color(c = [0.5000000000, 0.5000000000, 0.5000000000]) {
				translate(v = [0, 0, 2276.1000000000]) {
					linear_extrude(height = 340.0000000000) {
						polygon(paths = [[0, 1, 2, 3]], points = [[5205, 2125], [5205, 2295], [5375, 2295], [5375, 2125]]);
					}
				}
			}
			color(c = [0.5000000000, 0.5000000000, 0.5000000000]) {
				translate(v = [0, 0, 2276.1000000000]) {
					linear_extrude(height = 340.0000000000) {
						polygon(paths = [[0, 1, 2, 3]], points = [[145, 2635], [145, 2805], [315, 2805], [315, 2635]]);
					}
				}
			}
			color(c = [0.5000000000, 0.5000000000, 0.5000000000]) {
				translate(v = [0, 0, 2276.1000000000]) {
					linear_extrude(height = 340.0000000000) {
						polygon(paths = [[0, 1, 2, 3]], points = [[605, 2635], [605, 2805], [775, 2805], [775, 2635]]);
					}
				}
			}
			color(c = [0.5000000000, 0.5000000000, 0.5000000000]) {
				translate(v = [0, 0, 2276.1000000000]) {
					linear_extrude(height = 340.0000000000) {
						polygon(paths = [[0, 1, 2, 3]], points = [[1065, 2635], [1065, 2805], [1235, 2805], [1235, 2635]]);
					}
				}
			}
			color(c = [0.5000000000, 0.5000000000, 0.5000000000]) {
				translate(v = [0, 0, 2276.1000000000]) {
					linear_extrude(height = 340.0000000000) {
						polygon(paths = [[0, 1, 2, 3]], points = [[1525, 2635], [1525, 2805], [1695, 2805], [1695, 2635]]);
					}
				}
			}
			color(c = [0.5000000000, 0.5000000000, 0.5000000000]) {
				translate(v = [0, 0, 2276.1000000000]) {
					linear_extrude(height = 340.0000000000) {
						polygon(paths = [[0, 1, 2, 3]], points = [[1985, 2635], [1985, 2805], [2155, 2805], [2155, 2635]]);
					}
				}
			}
			color(c = [0.5000000000, 0.5000000000, 0.5000000000]) {
				translate(v = [0, 0, 2276.1000000000]) {
					linear_extrude(height = 340.0000000000) {
						polygon(paths = [[0, 1, 2, 3]], points = [[2445, 2635], [2445, 2805], [2615, 2805], [2615, 2635]]);
					}
				}
			}
			color(c = [0.5000000000, 0.5000000000, 0.5000000000]) {
				translate(v = [0, 0, 2276.1000000000]) {
					linear_extrude(height = 340.0000000000) {
						polygon(paths = [[0, 1, 2, 3]], points = [[2905, 2635], [2905, 2805], [3075, 2805], [3075, 2635]]);
					}
				}
			}
			color(c = [0.5000000000, 0.5000000000, 0.5000000000]) {
				translate(v = [0, 0, 2276.1000000000]) {
					linear_extrude(height = 340.0000000000) {
						polygon(paths = [[0, 1, 2, 3]], points = [[3365, 2635], [3365, 2805], [3535, 2805], [3535, 2635]]);
					}
				}
			}
			color(c = [0.5000000000, 0.5000000000, 0.5000000000]) {
				translate(v = [0, 0, 2276.1000000000]) {
					linear_extrude(height = 340.0000000000) {
						polygon(paths = [[0, 1, 2, 3]], points = [[3825, 2635], [3825, 2805], [3995, 2805], [3995, 2635]]);
					}
				}
			}
			color(c = [0.5000000000, 0.5000000000, 0.5000000000]) {
				translate(v = [0, 0, 2276.1000000000]) {
					linear_extrude(height = 340.0000000000) {
						polygon(paths = [[0, 1, 2, 3]], points = [[4285, 2635], [4285, 2805], [4455, 2805], [4455, 2635]]);
					}
				}
			}
			color(c = [0.5000000000, 0.5000000000, 0.5000000000]) {
				translate(v = [0, 0, 2276.1000000000]) {
					linear_extrude(height = 340.0000000000) {
						polygon(paths = [[0, 1, 2, 3]], points = [[4745, 2635], [4745, 2805], [4915, 2805], [4915, 2635]]);
					}
				}
			}
			color(c = [0.5000000000, 0.5000000000, 0.5000000000]) {
				translate(v = [0, 0, 2276.1000000000]) {
					linear_extrude(height = 340.0000000000) {
						polygon(paths = [[0, 1, 2, 3]], points = [[5205, 2635], [5205, 2805], [5375, 2805], [5375, 2635]]);
					}
				}
			}
			color(c = [0.3000000000, 0.3000000000, 1]) {
				translate(v = [0, 0, 2616.1000000000]) {
					linear_extrude(height = 360.0000000000) {
						polygon(paths = [[0, 1, 2, 3]], points = [[0, -240], [0, 240], [5520, 240], [5520, -240]]);
					}
				}
			}
			color(c = [0.3000000000, 0.3000000000, 1]) {
				translate(v = [0, 0, 2616.1000000000]) {
					linear_extrude(height = 360.0000000000) {
						polygon(paths = [[0, 1, 2, 3, 4, 5, 6, 7]], points = [[85, 2080], [85, 2140], [70, 2140], [70, 2340], [5450, 2340], [5450, 2140], [5435, 2140], [5435, 2080]]);
					}
				}
			}
			color(c = [0.3000000000, 0.3000000000, 1]) {
				translate(v = [0, 0, 2616.1000000000]) {
					linear_extrude(height = 360.0000000000) {
						polygon(paths = [[0, 1, 2, 3]], points = [[0, 2480], [0, 2960], [5520, 2960], [5520, 2480]]);
					}
				}
			}
		}
	}
}
